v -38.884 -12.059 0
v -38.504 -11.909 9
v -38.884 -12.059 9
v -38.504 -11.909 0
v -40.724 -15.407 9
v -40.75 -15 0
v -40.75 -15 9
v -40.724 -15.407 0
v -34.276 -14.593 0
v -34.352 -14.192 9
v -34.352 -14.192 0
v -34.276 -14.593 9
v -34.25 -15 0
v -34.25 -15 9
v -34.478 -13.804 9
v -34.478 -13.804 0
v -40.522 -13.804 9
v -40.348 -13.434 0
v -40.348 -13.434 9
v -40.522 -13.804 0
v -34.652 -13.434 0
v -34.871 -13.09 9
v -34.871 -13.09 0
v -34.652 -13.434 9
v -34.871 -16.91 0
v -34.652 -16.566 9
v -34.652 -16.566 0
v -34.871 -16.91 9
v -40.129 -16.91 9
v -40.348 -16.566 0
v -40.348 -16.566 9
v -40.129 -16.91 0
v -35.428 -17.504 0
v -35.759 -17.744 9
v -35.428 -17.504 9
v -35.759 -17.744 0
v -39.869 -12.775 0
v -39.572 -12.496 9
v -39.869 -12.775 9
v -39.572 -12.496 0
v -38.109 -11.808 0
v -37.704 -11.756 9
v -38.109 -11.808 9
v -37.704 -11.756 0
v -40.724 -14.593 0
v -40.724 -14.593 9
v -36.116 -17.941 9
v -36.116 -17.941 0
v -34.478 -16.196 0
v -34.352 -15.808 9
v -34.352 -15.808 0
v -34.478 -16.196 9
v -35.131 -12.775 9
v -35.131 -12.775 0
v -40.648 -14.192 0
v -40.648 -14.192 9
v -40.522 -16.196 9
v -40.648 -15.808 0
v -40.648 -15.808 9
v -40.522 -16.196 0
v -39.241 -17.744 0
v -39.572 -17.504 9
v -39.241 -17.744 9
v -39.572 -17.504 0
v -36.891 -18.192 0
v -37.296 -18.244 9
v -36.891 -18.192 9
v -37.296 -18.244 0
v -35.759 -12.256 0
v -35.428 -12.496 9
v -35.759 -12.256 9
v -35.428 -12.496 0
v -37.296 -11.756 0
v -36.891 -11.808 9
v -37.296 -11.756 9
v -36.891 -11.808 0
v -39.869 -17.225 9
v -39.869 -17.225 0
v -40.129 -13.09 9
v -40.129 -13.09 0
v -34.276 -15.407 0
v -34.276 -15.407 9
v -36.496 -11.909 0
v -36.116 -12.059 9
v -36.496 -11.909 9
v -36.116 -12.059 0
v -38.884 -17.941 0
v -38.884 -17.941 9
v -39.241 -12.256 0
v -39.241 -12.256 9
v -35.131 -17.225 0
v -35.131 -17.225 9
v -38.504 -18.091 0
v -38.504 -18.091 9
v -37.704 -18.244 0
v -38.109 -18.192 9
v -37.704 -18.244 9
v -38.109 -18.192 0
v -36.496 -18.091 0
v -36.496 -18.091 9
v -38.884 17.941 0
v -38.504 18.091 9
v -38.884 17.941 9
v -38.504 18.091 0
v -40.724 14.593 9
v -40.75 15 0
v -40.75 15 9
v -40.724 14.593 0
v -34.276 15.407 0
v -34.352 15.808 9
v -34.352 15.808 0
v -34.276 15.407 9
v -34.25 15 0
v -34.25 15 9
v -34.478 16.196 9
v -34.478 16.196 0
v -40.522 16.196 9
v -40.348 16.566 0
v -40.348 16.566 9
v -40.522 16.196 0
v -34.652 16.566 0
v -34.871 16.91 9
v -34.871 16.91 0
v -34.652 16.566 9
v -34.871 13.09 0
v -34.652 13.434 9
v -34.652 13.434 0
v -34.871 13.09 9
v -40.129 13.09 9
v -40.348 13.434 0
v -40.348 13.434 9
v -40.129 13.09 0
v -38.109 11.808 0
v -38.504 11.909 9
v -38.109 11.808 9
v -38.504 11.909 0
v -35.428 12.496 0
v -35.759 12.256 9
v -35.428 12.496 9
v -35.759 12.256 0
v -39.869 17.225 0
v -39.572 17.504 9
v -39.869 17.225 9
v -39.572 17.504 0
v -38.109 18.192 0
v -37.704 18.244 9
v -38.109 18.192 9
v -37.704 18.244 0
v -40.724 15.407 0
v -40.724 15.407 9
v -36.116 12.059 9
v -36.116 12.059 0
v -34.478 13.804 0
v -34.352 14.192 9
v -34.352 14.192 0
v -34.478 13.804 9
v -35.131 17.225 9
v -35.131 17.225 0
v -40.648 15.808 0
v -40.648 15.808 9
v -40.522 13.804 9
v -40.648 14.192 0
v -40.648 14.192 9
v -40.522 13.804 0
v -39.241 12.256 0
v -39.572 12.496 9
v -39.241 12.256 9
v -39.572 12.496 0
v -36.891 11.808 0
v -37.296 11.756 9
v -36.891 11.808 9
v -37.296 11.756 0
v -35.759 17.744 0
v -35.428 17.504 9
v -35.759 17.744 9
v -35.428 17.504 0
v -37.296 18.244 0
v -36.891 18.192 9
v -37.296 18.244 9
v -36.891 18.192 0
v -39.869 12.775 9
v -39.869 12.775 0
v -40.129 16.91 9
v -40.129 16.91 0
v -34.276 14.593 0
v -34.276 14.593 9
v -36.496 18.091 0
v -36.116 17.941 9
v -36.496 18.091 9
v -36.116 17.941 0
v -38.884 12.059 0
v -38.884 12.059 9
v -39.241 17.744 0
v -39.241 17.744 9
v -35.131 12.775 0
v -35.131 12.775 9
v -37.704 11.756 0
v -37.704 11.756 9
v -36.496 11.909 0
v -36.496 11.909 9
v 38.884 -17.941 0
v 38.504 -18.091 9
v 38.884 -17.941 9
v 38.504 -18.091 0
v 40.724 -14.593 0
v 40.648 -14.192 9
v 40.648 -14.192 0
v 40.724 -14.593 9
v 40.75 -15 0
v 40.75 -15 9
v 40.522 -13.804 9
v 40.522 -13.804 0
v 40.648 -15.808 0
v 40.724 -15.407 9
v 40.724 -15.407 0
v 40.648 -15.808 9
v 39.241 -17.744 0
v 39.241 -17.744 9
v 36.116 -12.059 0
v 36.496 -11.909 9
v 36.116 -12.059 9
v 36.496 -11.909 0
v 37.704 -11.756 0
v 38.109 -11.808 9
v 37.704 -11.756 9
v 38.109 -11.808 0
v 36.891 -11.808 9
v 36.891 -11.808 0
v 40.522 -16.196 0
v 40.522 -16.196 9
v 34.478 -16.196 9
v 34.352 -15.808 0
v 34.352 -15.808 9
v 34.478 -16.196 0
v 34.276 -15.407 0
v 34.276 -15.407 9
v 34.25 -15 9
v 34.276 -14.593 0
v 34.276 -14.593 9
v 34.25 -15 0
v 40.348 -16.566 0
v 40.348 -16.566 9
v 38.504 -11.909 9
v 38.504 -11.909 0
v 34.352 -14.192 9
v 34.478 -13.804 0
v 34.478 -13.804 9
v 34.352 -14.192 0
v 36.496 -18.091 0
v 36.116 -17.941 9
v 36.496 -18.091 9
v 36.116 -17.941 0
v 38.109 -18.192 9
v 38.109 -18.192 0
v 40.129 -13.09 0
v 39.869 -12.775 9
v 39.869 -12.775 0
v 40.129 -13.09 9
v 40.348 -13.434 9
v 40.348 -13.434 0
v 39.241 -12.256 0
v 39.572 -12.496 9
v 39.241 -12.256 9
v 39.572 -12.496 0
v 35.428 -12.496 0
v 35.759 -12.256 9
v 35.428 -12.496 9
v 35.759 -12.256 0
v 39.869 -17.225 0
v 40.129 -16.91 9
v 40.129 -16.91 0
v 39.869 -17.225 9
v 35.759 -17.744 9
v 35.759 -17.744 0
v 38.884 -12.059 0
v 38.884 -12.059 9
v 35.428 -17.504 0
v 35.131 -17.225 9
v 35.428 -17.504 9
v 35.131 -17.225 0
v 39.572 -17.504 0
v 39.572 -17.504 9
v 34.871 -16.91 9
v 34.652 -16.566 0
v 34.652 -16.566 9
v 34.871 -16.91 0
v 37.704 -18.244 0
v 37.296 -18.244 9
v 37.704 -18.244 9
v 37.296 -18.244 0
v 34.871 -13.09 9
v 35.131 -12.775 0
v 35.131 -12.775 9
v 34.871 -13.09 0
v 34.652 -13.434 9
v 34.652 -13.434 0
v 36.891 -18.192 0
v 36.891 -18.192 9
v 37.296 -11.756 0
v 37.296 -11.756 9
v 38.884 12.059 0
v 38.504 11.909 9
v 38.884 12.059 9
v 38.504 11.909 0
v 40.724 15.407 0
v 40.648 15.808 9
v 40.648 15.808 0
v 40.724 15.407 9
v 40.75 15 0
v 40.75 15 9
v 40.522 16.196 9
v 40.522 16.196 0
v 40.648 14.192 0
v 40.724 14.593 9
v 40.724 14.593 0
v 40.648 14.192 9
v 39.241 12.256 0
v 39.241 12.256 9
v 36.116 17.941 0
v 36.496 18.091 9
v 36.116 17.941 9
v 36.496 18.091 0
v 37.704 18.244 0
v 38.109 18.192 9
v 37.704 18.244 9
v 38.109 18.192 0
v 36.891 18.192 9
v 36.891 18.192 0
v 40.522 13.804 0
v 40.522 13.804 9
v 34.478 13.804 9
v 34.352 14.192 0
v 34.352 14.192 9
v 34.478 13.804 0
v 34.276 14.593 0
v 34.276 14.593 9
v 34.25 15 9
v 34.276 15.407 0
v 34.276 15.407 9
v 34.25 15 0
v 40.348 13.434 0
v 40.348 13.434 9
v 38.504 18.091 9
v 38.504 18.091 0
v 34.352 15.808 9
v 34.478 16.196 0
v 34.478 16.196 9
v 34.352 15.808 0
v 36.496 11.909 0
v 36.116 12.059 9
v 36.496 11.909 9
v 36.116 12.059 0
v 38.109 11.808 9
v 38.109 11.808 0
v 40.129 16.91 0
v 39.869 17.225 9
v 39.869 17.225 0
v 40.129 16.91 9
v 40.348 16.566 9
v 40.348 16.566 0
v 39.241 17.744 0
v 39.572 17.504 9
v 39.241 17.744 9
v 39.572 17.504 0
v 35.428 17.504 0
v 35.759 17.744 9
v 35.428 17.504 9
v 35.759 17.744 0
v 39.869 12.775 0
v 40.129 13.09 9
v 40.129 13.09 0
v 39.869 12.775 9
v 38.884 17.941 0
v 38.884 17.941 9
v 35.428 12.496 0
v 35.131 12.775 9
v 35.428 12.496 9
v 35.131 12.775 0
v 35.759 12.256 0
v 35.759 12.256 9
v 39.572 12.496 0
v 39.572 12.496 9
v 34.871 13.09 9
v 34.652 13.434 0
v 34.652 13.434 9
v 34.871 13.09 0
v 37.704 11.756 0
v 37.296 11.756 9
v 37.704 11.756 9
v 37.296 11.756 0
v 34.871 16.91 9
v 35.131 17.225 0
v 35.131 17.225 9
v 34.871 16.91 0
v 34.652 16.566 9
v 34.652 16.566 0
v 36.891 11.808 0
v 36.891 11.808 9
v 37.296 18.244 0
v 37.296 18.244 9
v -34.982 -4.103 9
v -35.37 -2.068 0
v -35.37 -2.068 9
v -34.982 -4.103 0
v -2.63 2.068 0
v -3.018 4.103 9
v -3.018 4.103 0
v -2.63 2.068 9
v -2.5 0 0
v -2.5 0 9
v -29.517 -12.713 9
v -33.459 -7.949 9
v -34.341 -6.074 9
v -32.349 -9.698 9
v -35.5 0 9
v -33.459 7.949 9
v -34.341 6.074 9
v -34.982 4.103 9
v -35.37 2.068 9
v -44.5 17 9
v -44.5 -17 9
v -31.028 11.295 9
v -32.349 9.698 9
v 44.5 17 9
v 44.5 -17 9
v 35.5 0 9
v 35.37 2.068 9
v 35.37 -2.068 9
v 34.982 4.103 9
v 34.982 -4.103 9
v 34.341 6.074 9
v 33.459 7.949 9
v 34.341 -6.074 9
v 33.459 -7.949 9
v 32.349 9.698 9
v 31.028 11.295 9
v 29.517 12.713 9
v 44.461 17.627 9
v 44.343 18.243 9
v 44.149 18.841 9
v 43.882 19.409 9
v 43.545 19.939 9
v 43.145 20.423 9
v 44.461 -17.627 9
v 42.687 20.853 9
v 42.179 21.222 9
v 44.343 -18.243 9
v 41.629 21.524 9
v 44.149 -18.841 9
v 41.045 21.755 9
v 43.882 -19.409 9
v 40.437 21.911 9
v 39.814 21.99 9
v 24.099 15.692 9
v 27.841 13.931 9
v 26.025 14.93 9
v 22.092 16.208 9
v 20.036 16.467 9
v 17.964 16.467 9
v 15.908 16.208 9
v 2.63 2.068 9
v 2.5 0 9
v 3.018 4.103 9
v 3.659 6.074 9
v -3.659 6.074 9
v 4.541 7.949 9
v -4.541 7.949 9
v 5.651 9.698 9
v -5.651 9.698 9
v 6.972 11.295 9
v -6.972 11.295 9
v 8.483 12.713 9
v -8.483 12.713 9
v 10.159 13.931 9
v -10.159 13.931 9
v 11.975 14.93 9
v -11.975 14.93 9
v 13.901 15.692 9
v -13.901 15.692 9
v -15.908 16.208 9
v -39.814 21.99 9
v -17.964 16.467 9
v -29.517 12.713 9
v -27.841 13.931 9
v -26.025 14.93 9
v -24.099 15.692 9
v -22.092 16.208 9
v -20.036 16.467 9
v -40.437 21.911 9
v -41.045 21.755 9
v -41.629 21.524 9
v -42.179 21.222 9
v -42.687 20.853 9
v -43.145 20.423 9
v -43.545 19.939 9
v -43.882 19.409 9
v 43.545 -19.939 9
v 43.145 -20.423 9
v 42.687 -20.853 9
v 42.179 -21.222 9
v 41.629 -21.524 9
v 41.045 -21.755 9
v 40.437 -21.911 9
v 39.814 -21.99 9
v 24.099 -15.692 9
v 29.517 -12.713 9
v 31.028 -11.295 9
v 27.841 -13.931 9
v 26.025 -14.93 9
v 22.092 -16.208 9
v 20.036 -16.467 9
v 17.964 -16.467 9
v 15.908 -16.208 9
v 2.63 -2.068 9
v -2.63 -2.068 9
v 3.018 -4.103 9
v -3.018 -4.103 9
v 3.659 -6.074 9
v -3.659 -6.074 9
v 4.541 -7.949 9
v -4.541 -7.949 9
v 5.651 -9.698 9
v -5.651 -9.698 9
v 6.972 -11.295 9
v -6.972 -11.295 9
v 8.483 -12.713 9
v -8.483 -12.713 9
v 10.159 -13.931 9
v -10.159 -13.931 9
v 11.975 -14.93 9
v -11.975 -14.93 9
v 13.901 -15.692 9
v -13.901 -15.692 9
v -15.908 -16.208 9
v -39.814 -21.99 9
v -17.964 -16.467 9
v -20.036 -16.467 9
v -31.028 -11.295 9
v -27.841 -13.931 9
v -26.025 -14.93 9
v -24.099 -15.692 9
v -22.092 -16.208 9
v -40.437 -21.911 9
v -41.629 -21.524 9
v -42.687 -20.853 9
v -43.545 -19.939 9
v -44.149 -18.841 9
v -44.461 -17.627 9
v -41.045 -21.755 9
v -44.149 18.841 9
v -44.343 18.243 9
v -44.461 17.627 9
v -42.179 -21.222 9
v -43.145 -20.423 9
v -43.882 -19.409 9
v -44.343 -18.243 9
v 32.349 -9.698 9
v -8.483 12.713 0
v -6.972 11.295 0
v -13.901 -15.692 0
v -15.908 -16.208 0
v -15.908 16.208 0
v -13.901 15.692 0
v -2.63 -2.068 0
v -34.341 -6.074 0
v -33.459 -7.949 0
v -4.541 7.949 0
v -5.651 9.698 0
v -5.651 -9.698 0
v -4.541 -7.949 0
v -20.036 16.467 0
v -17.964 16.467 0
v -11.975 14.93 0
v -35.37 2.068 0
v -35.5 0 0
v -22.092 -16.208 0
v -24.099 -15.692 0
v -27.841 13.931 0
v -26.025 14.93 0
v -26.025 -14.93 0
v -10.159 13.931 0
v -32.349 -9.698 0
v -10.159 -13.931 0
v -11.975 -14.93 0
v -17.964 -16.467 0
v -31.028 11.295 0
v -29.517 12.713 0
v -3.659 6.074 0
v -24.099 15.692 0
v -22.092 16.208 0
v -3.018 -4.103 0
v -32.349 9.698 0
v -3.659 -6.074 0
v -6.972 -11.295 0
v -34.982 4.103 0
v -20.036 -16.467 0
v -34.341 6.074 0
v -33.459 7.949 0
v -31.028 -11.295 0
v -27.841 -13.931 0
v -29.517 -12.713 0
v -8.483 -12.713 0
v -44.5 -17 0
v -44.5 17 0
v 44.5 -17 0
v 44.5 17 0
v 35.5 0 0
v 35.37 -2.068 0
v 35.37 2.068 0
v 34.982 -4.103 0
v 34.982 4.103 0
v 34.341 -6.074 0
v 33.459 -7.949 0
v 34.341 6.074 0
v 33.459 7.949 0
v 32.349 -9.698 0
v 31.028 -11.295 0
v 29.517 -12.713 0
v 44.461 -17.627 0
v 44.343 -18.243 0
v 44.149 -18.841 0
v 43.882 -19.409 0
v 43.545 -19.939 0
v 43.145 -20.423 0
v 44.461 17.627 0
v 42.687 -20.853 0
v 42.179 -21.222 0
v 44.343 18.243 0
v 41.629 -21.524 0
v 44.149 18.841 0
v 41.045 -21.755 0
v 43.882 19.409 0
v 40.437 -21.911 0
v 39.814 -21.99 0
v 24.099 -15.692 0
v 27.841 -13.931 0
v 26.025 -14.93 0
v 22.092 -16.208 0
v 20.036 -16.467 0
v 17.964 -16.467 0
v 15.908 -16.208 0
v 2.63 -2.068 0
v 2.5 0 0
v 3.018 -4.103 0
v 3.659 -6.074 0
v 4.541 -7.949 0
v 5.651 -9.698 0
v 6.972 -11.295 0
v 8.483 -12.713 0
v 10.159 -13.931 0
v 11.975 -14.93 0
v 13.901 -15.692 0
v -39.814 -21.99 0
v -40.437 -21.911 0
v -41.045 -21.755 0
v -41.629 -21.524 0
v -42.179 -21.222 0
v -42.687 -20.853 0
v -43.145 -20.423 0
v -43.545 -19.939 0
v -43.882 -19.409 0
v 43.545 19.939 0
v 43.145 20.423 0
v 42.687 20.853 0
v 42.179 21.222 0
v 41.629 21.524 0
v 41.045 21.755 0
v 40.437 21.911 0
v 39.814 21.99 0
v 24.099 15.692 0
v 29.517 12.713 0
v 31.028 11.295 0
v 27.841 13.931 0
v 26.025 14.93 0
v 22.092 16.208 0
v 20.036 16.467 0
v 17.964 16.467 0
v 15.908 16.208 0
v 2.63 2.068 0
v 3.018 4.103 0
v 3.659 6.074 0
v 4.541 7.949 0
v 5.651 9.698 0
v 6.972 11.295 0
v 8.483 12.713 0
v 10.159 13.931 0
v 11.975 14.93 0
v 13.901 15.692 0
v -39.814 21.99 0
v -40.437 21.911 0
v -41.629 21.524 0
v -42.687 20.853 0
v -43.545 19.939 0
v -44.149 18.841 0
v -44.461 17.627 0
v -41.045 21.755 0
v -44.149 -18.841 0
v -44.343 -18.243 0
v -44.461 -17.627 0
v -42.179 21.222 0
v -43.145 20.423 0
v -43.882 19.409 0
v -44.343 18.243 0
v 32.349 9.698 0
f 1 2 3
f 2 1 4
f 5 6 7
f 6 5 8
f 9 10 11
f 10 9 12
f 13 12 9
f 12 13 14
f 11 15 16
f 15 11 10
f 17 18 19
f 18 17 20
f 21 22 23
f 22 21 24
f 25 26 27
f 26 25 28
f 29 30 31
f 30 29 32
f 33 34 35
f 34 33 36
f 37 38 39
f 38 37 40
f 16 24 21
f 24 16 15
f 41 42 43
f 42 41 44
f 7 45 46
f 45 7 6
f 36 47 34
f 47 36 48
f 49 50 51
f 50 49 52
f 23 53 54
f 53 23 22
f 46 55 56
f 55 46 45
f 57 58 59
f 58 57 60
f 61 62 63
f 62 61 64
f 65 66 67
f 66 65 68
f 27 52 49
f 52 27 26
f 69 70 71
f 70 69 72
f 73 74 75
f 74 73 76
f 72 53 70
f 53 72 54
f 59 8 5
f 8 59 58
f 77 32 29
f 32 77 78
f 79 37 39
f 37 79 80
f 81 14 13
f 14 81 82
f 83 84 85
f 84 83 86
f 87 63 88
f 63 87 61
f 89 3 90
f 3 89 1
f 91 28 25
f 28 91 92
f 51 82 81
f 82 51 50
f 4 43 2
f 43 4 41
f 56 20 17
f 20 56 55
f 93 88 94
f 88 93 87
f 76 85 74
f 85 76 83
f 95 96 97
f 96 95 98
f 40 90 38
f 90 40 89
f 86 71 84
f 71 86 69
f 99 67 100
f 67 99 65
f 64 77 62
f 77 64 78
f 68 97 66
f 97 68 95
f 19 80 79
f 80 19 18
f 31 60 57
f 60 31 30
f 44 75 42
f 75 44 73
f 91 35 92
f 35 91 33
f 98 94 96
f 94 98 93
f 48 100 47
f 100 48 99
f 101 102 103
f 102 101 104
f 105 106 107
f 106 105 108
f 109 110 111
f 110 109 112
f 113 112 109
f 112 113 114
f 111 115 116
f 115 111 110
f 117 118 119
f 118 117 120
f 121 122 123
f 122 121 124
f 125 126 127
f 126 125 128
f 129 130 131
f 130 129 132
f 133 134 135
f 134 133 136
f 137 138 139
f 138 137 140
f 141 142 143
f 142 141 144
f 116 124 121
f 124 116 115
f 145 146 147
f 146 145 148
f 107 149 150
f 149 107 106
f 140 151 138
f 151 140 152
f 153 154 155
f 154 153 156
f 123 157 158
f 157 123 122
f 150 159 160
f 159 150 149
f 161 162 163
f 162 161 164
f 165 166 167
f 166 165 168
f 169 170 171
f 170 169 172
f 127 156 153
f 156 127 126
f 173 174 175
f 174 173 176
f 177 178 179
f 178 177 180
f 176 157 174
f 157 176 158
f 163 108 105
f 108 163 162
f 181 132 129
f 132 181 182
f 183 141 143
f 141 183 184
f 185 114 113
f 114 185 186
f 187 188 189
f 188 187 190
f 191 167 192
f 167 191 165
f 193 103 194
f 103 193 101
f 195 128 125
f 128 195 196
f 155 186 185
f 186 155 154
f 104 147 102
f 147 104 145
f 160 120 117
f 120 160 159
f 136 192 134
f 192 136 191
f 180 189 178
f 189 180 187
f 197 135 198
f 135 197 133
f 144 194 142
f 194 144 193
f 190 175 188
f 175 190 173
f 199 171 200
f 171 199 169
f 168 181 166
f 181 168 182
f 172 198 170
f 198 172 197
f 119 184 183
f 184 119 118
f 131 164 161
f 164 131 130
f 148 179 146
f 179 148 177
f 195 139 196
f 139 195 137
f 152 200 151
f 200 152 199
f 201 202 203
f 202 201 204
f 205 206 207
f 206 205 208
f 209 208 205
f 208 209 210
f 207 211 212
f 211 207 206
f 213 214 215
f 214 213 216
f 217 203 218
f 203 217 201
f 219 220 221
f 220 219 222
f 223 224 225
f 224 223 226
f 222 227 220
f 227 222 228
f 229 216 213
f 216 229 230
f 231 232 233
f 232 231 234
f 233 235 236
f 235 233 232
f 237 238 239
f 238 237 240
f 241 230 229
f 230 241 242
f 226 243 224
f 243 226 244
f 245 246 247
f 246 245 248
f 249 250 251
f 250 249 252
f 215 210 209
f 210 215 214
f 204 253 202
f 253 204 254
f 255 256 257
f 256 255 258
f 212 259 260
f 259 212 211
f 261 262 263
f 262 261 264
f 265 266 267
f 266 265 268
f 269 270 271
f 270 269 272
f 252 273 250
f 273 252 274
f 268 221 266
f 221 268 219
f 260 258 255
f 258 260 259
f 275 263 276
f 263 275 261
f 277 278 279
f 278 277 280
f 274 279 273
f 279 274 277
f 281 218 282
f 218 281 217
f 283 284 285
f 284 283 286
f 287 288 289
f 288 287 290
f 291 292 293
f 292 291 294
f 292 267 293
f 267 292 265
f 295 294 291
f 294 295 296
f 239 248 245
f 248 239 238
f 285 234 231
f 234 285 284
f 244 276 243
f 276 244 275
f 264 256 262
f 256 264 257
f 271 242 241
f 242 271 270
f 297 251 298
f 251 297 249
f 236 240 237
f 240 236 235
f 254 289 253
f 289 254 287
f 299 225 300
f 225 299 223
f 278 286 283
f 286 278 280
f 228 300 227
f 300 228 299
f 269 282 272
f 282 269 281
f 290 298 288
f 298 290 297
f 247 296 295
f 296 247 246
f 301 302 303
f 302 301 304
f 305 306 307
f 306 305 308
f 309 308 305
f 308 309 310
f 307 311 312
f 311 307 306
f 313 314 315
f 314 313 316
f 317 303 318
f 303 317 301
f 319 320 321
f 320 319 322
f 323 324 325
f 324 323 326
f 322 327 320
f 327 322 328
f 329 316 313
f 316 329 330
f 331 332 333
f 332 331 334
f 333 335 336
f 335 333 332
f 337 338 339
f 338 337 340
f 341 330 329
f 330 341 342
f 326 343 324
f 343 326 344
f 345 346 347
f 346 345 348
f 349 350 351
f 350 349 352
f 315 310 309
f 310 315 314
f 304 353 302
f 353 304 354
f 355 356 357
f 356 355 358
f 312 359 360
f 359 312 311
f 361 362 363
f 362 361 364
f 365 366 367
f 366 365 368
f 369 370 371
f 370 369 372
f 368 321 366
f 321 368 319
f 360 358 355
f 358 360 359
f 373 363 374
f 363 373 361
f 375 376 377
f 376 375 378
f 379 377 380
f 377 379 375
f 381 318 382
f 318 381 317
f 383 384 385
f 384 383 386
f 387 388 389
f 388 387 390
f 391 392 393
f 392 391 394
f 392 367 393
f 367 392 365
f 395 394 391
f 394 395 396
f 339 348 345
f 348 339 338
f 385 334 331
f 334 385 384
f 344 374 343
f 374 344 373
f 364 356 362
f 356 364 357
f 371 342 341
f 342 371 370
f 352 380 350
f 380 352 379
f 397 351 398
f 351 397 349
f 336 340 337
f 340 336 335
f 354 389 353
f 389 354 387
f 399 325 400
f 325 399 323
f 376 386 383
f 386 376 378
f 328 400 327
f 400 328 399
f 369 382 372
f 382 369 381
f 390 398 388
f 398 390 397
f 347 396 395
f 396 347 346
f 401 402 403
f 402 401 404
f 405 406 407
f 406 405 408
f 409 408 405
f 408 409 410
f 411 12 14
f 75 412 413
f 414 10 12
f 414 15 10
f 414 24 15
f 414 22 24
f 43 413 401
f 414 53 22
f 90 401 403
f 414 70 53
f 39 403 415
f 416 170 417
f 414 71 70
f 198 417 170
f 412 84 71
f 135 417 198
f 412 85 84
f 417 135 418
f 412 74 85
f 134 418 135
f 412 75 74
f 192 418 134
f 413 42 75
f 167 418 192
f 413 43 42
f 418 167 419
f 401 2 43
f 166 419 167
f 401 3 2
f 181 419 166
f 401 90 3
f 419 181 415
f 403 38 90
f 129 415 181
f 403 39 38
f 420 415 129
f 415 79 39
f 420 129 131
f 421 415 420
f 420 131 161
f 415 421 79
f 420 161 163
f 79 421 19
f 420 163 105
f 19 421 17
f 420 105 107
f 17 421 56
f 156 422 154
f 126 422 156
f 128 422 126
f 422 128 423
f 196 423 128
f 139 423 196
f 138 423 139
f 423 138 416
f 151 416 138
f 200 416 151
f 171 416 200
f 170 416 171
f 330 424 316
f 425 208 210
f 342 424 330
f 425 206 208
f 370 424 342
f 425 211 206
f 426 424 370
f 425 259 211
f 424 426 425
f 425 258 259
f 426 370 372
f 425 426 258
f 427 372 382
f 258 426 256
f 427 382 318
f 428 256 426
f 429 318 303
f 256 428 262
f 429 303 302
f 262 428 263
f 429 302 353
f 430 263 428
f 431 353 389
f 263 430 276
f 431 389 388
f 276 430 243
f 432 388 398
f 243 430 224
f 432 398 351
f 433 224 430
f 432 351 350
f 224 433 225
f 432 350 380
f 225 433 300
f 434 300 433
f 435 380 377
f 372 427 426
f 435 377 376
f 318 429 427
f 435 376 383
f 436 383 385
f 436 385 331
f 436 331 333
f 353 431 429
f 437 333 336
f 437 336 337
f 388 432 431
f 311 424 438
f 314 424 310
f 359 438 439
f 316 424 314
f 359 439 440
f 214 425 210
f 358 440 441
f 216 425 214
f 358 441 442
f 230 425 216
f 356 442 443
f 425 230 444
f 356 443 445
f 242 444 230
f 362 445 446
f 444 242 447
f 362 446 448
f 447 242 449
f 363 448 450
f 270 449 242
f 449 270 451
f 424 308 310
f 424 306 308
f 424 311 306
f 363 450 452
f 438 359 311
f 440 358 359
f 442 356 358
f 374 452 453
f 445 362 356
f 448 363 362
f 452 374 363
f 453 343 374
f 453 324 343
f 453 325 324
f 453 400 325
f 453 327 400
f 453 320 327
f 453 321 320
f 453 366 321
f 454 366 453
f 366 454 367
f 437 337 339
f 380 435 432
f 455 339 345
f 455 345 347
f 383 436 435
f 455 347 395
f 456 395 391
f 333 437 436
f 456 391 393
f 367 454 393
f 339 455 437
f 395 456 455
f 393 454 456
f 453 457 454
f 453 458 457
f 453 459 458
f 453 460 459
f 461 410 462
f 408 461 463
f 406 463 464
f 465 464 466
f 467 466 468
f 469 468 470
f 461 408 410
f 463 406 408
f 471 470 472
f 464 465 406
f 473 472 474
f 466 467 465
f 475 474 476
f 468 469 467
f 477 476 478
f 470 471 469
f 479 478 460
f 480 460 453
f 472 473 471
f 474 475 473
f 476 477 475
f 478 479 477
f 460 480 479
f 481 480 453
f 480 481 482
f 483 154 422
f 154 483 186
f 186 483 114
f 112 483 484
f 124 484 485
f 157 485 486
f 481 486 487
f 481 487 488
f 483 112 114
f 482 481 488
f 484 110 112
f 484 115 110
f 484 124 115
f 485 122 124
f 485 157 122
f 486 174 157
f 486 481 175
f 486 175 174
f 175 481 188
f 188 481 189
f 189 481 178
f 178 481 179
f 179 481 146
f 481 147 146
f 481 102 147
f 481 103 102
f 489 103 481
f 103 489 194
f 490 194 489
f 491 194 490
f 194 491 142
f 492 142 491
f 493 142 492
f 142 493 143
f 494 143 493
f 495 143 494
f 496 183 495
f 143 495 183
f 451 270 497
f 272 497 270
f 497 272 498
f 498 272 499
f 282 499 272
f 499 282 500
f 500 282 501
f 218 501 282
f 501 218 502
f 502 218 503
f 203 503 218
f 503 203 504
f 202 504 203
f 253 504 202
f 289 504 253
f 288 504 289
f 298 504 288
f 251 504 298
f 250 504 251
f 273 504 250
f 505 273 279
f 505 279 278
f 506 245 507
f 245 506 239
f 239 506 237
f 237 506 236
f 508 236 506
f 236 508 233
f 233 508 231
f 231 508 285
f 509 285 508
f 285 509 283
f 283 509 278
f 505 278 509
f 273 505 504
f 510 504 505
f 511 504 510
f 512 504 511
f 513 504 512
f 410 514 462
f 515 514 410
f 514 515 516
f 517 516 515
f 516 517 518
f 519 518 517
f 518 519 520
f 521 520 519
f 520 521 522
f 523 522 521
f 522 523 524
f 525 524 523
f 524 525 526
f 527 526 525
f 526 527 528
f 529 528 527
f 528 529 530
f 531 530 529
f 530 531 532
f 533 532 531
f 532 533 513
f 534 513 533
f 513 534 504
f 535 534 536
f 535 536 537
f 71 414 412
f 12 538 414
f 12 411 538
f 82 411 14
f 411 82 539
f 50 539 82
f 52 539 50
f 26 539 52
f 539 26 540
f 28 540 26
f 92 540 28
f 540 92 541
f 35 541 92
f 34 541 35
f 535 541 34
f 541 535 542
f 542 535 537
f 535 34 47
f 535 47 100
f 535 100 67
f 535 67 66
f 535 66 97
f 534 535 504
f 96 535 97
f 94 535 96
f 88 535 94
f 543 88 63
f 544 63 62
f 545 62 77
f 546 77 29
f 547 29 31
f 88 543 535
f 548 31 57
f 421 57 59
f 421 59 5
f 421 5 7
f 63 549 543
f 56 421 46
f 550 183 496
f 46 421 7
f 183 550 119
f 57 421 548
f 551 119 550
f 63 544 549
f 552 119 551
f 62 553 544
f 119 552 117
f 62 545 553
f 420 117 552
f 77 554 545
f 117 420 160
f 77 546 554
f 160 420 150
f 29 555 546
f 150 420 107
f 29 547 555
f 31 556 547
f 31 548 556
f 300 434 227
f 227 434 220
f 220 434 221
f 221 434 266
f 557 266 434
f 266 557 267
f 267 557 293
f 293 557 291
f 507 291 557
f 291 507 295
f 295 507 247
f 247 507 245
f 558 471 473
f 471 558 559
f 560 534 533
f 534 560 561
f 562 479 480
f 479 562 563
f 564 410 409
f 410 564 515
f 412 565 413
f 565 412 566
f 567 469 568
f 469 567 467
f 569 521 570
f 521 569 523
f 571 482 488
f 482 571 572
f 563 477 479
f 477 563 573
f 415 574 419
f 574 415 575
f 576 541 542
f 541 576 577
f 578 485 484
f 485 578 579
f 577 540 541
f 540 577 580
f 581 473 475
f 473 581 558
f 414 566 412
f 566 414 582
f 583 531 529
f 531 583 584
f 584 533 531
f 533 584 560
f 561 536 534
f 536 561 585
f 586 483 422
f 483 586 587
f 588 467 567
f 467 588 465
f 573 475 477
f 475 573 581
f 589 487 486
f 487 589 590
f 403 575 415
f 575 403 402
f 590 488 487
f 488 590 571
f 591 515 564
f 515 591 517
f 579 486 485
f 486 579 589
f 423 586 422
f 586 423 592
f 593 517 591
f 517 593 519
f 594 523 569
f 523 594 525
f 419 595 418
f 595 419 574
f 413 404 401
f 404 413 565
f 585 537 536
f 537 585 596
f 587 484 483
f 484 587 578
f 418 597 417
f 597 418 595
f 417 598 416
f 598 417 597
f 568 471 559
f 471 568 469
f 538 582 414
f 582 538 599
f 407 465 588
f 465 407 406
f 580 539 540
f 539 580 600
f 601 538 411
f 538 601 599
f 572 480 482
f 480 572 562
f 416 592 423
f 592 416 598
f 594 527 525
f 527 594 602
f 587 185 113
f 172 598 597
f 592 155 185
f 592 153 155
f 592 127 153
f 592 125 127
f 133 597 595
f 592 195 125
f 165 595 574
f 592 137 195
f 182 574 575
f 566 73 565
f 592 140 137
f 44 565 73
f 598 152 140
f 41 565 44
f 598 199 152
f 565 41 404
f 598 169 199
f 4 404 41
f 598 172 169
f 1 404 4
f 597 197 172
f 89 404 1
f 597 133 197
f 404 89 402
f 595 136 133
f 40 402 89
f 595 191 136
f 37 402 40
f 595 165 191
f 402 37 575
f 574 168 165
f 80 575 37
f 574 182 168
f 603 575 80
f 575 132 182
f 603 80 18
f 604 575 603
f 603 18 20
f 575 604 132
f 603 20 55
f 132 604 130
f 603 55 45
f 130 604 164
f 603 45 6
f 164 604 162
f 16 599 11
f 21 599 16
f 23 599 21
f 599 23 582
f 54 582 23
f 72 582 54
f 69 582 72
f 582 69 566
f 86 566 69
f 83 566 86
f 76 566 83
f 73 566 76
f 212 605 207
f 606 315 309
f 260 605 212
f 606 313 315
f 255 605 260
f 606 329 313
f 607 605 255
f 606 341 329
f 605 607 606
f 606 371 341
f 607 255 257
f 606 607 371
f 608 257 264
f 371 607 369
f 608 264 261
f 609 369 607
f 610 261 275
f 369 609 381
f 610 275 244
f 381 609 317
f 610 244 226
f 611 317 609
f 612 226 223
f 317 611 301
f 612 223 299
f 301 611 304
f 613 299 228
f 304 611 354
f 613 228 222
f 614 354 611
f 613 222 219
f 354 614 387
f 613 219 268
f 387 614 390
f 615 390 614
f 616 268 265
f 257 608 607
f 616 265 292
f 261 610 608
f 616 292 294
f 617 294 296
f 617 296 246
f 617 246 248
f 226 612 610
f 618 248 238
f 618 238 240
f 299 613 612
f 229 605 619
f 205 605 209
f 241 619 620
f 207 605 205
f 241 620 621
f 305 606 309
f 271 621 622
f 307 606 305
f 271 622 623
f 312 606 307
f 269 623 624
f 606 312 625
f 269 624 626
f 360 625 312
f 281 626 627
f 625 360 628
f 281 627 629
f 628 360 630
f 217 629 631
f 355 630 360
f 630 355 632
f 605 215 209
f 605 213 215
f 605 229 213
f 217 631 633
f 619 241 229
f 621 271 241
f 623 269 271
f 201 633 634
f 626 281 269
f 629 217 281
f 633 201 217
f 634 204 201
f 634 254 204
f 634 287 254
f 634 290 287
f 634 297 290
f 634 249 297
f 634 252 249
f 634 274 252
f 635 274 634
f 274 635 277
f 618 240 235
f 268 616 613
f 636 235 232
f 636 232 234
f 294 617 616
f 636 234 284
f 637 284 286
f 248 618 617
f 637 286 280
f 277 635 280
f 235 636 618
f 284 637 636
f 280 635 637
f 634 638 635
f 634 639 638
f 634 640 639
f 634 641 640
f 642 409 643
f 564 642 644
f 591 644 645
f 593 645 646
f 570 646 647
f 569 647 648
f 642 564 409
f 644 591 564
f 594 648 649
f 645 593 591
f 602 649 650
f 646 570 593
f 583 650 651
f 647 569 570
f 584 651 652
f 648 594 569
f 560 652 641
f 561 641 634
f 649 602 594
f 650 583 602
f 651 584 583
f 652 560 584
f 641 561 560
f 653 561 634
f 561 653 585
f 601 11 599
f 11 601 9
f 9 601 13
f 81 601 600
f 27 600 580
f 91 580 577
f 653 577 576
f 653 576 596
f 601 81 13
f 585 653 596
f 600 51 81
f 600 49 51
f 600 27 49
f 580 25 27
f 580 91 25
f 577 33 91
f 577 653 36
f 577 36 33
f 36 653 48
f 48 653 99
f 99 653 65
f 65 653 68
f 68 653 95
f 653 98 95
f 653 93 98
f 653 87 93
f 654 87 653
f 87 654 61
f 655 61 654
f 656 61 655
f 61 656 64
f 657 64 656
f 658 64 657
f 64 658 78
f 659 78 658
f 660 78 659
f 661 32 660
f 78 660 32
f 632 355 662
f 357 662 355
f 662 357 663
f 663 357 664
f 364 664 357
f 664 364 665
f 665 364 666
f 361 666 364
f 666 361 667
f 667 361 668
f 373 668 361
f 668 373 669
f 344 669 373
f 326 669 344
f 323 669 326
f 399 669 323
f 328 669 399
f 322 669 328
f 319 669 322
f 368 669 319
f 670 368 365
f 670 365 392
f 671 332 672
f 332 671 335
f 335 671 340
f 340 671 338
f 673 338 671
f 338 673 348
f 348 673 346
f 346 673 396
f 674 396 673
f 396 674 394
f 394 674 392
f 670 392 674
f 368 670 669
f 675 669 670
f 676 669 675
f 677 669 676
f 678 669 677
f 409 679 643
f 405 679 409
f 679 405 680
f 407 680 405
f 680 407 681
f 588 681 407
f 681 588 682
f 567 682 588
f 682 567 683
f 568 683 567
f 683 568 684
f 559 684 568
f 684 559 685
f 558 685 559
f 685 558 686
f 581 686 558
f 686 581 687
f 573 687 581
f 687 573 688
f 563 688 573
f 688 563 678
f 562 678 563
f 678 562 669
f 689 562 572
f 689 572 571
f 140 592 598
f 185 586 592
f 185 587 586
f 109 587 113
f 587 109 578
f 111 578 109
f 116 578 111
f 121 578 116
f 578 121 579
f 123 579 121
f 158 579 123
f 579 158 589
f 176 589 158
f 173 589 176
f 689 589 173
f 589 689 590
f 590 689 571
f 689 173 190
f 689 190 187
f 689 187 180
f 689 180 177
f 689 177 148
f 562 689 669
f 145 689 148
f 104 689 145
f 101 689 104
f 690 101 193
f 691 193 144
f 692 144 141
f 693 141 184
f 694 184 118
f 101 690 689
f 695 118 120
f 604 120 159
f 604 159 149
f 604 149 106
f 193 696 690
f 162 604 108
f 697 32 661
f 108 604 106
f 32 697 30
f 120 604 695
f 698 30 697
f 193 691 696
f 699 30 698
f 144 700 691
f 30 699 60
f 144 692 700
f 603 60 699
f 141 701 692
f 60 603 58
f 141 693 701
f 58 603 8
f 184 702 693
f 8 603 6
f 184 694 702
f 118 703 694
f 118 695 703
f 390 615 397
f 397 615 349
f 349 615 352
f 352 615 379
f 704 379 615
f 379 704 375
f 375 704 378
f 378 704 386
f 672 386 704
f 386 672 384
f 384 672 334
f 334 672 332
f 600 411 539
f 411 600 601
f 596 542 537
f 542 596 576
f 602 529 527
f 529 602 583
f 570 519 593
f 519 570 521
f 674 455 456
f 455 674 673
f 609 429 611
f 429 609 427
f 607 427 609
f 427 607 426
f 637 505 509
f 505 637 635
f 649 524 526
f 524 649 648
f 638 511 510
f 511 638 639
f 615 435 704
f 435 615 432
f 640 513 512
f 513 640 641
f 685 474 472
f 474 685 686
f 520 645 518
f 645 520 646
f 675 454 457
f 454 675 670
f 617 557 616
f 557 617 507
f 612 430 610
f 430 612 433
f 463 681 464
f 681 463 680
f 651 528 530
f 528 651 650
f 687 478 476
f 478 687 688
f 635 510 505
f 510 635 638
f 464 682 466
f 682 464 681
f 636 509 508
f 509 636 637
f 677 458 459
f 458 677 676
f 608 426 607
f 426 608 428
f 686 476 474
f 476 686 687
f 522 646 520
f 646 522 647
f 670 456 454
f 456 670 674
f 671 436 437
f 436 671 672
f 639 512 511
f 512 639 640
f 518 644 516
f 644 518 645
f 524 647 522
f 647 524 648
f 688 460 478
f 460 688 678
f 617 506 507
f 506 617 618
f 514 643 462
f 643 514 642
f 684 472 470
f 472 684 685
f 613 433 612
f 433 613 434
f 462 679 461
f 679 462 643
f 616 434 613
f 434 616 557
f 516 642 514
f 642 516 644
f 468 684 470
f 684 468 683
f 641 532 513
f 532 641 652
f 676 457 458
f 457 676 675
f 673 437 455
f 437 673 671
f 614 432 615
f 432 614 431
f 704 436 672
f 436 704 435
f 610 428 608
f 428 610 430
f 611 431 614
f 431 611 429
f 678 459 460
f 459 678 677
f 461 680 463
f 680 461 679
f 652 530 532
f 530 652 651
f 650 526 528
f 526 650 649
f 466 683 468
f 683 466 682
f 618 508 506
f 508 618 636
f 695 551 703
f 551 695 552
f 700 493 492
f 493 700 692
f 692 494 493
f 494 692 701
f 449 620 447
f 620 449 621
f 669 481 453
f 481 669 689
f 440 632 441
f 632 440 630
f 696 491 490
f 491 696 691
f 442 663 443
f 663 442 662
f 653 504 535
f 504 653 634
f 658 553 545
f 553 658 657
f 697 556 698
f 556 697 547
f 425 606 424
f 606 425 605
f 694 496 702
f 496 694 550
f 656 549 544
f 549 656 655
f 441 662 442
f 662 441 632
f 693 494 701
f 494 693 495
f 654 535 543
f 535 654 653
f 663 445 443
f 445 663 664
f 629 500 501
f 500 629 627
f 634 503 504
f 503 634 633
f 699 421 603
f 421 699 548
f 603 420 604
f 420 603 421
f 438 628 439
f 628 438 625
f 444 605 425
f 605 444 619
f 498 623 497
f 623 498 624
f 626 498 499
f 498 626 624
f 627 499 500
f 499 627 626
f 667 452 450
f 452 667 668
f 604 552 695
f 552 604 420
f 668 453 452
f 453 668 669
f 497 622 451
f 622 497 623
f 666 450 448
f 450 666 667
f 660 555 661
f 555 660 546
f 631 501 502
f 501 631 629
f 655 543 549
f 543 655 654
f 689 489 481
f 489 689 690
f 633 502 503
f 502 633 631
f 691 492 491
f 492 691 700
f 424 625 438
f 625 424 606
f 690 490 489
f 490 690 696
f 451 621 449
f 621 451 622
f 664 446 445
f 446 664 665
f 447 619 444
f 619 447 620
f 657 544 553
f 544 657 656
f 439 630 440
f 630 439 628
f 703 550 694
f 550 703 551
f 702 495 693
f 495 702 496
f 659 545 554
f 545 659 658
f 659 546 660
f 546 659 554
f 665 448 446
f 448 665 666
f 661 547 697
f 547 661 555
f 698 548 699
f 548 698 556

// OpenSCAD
$fn = 50;

difference() {
	union() {
		hull() {
			translate(v = [-39.5, 17.0, 0]) {
				cylinder(h = 9, r = 5);
			}
			translate(v = [39.5, 17.0, 0]) {
				cylinder(h = 9, r = 5);
			}
			translate(v = [-39.5, -17.0, 0]) {
				cylinder(h = 9, r = 5);
			}
			translate(v = [39.5, -17.0, 0]) {
				cylinder(h = 9, r = 5);
			}
		}
	}
	union() {
		translate(v = [-37.5, -15.0, -100.0]) {
			cylinder(h = 200, r = 3.25);
		}
		translate(v = [-37.5, 15.0, -100.0]) {
			cylinder(h = 200, r = 3.25);
		}
		translate(v = [37.5, -15.0, -100.0]) {
			cylinder(h = 200, r = 3.25);
		}
		translate(v = [37.5, 15.0, -100.0]) {
			cylinder(h = 200, r = 3.25);
		}
		translate(v = [-37.5, -15.0, -100.0]) {
			cylinder(h = 200, r = 1.8);
		}
		translate(v = [-37.5, 15.0, -100.0]) {
			cylinder(h = 200, r = 1.8);
		}
		translate(v = [37.5, -15.0, -100.0]) {
			cylinder(h = 200, r = 1.8);
		}
		translate(v = [37.5, 15.0, -100.0]) {
			cylinder(h = 200, r = 1.8);
		}
		translate(v = [-19.0, 0, 0.0]) {
			cylinder(h = 9, r = 16.5);
		}
		translate(v = [19.0, 0, 0.0]) {
			cylinder(h = 9, r = 16.5);
		}
	}
}
